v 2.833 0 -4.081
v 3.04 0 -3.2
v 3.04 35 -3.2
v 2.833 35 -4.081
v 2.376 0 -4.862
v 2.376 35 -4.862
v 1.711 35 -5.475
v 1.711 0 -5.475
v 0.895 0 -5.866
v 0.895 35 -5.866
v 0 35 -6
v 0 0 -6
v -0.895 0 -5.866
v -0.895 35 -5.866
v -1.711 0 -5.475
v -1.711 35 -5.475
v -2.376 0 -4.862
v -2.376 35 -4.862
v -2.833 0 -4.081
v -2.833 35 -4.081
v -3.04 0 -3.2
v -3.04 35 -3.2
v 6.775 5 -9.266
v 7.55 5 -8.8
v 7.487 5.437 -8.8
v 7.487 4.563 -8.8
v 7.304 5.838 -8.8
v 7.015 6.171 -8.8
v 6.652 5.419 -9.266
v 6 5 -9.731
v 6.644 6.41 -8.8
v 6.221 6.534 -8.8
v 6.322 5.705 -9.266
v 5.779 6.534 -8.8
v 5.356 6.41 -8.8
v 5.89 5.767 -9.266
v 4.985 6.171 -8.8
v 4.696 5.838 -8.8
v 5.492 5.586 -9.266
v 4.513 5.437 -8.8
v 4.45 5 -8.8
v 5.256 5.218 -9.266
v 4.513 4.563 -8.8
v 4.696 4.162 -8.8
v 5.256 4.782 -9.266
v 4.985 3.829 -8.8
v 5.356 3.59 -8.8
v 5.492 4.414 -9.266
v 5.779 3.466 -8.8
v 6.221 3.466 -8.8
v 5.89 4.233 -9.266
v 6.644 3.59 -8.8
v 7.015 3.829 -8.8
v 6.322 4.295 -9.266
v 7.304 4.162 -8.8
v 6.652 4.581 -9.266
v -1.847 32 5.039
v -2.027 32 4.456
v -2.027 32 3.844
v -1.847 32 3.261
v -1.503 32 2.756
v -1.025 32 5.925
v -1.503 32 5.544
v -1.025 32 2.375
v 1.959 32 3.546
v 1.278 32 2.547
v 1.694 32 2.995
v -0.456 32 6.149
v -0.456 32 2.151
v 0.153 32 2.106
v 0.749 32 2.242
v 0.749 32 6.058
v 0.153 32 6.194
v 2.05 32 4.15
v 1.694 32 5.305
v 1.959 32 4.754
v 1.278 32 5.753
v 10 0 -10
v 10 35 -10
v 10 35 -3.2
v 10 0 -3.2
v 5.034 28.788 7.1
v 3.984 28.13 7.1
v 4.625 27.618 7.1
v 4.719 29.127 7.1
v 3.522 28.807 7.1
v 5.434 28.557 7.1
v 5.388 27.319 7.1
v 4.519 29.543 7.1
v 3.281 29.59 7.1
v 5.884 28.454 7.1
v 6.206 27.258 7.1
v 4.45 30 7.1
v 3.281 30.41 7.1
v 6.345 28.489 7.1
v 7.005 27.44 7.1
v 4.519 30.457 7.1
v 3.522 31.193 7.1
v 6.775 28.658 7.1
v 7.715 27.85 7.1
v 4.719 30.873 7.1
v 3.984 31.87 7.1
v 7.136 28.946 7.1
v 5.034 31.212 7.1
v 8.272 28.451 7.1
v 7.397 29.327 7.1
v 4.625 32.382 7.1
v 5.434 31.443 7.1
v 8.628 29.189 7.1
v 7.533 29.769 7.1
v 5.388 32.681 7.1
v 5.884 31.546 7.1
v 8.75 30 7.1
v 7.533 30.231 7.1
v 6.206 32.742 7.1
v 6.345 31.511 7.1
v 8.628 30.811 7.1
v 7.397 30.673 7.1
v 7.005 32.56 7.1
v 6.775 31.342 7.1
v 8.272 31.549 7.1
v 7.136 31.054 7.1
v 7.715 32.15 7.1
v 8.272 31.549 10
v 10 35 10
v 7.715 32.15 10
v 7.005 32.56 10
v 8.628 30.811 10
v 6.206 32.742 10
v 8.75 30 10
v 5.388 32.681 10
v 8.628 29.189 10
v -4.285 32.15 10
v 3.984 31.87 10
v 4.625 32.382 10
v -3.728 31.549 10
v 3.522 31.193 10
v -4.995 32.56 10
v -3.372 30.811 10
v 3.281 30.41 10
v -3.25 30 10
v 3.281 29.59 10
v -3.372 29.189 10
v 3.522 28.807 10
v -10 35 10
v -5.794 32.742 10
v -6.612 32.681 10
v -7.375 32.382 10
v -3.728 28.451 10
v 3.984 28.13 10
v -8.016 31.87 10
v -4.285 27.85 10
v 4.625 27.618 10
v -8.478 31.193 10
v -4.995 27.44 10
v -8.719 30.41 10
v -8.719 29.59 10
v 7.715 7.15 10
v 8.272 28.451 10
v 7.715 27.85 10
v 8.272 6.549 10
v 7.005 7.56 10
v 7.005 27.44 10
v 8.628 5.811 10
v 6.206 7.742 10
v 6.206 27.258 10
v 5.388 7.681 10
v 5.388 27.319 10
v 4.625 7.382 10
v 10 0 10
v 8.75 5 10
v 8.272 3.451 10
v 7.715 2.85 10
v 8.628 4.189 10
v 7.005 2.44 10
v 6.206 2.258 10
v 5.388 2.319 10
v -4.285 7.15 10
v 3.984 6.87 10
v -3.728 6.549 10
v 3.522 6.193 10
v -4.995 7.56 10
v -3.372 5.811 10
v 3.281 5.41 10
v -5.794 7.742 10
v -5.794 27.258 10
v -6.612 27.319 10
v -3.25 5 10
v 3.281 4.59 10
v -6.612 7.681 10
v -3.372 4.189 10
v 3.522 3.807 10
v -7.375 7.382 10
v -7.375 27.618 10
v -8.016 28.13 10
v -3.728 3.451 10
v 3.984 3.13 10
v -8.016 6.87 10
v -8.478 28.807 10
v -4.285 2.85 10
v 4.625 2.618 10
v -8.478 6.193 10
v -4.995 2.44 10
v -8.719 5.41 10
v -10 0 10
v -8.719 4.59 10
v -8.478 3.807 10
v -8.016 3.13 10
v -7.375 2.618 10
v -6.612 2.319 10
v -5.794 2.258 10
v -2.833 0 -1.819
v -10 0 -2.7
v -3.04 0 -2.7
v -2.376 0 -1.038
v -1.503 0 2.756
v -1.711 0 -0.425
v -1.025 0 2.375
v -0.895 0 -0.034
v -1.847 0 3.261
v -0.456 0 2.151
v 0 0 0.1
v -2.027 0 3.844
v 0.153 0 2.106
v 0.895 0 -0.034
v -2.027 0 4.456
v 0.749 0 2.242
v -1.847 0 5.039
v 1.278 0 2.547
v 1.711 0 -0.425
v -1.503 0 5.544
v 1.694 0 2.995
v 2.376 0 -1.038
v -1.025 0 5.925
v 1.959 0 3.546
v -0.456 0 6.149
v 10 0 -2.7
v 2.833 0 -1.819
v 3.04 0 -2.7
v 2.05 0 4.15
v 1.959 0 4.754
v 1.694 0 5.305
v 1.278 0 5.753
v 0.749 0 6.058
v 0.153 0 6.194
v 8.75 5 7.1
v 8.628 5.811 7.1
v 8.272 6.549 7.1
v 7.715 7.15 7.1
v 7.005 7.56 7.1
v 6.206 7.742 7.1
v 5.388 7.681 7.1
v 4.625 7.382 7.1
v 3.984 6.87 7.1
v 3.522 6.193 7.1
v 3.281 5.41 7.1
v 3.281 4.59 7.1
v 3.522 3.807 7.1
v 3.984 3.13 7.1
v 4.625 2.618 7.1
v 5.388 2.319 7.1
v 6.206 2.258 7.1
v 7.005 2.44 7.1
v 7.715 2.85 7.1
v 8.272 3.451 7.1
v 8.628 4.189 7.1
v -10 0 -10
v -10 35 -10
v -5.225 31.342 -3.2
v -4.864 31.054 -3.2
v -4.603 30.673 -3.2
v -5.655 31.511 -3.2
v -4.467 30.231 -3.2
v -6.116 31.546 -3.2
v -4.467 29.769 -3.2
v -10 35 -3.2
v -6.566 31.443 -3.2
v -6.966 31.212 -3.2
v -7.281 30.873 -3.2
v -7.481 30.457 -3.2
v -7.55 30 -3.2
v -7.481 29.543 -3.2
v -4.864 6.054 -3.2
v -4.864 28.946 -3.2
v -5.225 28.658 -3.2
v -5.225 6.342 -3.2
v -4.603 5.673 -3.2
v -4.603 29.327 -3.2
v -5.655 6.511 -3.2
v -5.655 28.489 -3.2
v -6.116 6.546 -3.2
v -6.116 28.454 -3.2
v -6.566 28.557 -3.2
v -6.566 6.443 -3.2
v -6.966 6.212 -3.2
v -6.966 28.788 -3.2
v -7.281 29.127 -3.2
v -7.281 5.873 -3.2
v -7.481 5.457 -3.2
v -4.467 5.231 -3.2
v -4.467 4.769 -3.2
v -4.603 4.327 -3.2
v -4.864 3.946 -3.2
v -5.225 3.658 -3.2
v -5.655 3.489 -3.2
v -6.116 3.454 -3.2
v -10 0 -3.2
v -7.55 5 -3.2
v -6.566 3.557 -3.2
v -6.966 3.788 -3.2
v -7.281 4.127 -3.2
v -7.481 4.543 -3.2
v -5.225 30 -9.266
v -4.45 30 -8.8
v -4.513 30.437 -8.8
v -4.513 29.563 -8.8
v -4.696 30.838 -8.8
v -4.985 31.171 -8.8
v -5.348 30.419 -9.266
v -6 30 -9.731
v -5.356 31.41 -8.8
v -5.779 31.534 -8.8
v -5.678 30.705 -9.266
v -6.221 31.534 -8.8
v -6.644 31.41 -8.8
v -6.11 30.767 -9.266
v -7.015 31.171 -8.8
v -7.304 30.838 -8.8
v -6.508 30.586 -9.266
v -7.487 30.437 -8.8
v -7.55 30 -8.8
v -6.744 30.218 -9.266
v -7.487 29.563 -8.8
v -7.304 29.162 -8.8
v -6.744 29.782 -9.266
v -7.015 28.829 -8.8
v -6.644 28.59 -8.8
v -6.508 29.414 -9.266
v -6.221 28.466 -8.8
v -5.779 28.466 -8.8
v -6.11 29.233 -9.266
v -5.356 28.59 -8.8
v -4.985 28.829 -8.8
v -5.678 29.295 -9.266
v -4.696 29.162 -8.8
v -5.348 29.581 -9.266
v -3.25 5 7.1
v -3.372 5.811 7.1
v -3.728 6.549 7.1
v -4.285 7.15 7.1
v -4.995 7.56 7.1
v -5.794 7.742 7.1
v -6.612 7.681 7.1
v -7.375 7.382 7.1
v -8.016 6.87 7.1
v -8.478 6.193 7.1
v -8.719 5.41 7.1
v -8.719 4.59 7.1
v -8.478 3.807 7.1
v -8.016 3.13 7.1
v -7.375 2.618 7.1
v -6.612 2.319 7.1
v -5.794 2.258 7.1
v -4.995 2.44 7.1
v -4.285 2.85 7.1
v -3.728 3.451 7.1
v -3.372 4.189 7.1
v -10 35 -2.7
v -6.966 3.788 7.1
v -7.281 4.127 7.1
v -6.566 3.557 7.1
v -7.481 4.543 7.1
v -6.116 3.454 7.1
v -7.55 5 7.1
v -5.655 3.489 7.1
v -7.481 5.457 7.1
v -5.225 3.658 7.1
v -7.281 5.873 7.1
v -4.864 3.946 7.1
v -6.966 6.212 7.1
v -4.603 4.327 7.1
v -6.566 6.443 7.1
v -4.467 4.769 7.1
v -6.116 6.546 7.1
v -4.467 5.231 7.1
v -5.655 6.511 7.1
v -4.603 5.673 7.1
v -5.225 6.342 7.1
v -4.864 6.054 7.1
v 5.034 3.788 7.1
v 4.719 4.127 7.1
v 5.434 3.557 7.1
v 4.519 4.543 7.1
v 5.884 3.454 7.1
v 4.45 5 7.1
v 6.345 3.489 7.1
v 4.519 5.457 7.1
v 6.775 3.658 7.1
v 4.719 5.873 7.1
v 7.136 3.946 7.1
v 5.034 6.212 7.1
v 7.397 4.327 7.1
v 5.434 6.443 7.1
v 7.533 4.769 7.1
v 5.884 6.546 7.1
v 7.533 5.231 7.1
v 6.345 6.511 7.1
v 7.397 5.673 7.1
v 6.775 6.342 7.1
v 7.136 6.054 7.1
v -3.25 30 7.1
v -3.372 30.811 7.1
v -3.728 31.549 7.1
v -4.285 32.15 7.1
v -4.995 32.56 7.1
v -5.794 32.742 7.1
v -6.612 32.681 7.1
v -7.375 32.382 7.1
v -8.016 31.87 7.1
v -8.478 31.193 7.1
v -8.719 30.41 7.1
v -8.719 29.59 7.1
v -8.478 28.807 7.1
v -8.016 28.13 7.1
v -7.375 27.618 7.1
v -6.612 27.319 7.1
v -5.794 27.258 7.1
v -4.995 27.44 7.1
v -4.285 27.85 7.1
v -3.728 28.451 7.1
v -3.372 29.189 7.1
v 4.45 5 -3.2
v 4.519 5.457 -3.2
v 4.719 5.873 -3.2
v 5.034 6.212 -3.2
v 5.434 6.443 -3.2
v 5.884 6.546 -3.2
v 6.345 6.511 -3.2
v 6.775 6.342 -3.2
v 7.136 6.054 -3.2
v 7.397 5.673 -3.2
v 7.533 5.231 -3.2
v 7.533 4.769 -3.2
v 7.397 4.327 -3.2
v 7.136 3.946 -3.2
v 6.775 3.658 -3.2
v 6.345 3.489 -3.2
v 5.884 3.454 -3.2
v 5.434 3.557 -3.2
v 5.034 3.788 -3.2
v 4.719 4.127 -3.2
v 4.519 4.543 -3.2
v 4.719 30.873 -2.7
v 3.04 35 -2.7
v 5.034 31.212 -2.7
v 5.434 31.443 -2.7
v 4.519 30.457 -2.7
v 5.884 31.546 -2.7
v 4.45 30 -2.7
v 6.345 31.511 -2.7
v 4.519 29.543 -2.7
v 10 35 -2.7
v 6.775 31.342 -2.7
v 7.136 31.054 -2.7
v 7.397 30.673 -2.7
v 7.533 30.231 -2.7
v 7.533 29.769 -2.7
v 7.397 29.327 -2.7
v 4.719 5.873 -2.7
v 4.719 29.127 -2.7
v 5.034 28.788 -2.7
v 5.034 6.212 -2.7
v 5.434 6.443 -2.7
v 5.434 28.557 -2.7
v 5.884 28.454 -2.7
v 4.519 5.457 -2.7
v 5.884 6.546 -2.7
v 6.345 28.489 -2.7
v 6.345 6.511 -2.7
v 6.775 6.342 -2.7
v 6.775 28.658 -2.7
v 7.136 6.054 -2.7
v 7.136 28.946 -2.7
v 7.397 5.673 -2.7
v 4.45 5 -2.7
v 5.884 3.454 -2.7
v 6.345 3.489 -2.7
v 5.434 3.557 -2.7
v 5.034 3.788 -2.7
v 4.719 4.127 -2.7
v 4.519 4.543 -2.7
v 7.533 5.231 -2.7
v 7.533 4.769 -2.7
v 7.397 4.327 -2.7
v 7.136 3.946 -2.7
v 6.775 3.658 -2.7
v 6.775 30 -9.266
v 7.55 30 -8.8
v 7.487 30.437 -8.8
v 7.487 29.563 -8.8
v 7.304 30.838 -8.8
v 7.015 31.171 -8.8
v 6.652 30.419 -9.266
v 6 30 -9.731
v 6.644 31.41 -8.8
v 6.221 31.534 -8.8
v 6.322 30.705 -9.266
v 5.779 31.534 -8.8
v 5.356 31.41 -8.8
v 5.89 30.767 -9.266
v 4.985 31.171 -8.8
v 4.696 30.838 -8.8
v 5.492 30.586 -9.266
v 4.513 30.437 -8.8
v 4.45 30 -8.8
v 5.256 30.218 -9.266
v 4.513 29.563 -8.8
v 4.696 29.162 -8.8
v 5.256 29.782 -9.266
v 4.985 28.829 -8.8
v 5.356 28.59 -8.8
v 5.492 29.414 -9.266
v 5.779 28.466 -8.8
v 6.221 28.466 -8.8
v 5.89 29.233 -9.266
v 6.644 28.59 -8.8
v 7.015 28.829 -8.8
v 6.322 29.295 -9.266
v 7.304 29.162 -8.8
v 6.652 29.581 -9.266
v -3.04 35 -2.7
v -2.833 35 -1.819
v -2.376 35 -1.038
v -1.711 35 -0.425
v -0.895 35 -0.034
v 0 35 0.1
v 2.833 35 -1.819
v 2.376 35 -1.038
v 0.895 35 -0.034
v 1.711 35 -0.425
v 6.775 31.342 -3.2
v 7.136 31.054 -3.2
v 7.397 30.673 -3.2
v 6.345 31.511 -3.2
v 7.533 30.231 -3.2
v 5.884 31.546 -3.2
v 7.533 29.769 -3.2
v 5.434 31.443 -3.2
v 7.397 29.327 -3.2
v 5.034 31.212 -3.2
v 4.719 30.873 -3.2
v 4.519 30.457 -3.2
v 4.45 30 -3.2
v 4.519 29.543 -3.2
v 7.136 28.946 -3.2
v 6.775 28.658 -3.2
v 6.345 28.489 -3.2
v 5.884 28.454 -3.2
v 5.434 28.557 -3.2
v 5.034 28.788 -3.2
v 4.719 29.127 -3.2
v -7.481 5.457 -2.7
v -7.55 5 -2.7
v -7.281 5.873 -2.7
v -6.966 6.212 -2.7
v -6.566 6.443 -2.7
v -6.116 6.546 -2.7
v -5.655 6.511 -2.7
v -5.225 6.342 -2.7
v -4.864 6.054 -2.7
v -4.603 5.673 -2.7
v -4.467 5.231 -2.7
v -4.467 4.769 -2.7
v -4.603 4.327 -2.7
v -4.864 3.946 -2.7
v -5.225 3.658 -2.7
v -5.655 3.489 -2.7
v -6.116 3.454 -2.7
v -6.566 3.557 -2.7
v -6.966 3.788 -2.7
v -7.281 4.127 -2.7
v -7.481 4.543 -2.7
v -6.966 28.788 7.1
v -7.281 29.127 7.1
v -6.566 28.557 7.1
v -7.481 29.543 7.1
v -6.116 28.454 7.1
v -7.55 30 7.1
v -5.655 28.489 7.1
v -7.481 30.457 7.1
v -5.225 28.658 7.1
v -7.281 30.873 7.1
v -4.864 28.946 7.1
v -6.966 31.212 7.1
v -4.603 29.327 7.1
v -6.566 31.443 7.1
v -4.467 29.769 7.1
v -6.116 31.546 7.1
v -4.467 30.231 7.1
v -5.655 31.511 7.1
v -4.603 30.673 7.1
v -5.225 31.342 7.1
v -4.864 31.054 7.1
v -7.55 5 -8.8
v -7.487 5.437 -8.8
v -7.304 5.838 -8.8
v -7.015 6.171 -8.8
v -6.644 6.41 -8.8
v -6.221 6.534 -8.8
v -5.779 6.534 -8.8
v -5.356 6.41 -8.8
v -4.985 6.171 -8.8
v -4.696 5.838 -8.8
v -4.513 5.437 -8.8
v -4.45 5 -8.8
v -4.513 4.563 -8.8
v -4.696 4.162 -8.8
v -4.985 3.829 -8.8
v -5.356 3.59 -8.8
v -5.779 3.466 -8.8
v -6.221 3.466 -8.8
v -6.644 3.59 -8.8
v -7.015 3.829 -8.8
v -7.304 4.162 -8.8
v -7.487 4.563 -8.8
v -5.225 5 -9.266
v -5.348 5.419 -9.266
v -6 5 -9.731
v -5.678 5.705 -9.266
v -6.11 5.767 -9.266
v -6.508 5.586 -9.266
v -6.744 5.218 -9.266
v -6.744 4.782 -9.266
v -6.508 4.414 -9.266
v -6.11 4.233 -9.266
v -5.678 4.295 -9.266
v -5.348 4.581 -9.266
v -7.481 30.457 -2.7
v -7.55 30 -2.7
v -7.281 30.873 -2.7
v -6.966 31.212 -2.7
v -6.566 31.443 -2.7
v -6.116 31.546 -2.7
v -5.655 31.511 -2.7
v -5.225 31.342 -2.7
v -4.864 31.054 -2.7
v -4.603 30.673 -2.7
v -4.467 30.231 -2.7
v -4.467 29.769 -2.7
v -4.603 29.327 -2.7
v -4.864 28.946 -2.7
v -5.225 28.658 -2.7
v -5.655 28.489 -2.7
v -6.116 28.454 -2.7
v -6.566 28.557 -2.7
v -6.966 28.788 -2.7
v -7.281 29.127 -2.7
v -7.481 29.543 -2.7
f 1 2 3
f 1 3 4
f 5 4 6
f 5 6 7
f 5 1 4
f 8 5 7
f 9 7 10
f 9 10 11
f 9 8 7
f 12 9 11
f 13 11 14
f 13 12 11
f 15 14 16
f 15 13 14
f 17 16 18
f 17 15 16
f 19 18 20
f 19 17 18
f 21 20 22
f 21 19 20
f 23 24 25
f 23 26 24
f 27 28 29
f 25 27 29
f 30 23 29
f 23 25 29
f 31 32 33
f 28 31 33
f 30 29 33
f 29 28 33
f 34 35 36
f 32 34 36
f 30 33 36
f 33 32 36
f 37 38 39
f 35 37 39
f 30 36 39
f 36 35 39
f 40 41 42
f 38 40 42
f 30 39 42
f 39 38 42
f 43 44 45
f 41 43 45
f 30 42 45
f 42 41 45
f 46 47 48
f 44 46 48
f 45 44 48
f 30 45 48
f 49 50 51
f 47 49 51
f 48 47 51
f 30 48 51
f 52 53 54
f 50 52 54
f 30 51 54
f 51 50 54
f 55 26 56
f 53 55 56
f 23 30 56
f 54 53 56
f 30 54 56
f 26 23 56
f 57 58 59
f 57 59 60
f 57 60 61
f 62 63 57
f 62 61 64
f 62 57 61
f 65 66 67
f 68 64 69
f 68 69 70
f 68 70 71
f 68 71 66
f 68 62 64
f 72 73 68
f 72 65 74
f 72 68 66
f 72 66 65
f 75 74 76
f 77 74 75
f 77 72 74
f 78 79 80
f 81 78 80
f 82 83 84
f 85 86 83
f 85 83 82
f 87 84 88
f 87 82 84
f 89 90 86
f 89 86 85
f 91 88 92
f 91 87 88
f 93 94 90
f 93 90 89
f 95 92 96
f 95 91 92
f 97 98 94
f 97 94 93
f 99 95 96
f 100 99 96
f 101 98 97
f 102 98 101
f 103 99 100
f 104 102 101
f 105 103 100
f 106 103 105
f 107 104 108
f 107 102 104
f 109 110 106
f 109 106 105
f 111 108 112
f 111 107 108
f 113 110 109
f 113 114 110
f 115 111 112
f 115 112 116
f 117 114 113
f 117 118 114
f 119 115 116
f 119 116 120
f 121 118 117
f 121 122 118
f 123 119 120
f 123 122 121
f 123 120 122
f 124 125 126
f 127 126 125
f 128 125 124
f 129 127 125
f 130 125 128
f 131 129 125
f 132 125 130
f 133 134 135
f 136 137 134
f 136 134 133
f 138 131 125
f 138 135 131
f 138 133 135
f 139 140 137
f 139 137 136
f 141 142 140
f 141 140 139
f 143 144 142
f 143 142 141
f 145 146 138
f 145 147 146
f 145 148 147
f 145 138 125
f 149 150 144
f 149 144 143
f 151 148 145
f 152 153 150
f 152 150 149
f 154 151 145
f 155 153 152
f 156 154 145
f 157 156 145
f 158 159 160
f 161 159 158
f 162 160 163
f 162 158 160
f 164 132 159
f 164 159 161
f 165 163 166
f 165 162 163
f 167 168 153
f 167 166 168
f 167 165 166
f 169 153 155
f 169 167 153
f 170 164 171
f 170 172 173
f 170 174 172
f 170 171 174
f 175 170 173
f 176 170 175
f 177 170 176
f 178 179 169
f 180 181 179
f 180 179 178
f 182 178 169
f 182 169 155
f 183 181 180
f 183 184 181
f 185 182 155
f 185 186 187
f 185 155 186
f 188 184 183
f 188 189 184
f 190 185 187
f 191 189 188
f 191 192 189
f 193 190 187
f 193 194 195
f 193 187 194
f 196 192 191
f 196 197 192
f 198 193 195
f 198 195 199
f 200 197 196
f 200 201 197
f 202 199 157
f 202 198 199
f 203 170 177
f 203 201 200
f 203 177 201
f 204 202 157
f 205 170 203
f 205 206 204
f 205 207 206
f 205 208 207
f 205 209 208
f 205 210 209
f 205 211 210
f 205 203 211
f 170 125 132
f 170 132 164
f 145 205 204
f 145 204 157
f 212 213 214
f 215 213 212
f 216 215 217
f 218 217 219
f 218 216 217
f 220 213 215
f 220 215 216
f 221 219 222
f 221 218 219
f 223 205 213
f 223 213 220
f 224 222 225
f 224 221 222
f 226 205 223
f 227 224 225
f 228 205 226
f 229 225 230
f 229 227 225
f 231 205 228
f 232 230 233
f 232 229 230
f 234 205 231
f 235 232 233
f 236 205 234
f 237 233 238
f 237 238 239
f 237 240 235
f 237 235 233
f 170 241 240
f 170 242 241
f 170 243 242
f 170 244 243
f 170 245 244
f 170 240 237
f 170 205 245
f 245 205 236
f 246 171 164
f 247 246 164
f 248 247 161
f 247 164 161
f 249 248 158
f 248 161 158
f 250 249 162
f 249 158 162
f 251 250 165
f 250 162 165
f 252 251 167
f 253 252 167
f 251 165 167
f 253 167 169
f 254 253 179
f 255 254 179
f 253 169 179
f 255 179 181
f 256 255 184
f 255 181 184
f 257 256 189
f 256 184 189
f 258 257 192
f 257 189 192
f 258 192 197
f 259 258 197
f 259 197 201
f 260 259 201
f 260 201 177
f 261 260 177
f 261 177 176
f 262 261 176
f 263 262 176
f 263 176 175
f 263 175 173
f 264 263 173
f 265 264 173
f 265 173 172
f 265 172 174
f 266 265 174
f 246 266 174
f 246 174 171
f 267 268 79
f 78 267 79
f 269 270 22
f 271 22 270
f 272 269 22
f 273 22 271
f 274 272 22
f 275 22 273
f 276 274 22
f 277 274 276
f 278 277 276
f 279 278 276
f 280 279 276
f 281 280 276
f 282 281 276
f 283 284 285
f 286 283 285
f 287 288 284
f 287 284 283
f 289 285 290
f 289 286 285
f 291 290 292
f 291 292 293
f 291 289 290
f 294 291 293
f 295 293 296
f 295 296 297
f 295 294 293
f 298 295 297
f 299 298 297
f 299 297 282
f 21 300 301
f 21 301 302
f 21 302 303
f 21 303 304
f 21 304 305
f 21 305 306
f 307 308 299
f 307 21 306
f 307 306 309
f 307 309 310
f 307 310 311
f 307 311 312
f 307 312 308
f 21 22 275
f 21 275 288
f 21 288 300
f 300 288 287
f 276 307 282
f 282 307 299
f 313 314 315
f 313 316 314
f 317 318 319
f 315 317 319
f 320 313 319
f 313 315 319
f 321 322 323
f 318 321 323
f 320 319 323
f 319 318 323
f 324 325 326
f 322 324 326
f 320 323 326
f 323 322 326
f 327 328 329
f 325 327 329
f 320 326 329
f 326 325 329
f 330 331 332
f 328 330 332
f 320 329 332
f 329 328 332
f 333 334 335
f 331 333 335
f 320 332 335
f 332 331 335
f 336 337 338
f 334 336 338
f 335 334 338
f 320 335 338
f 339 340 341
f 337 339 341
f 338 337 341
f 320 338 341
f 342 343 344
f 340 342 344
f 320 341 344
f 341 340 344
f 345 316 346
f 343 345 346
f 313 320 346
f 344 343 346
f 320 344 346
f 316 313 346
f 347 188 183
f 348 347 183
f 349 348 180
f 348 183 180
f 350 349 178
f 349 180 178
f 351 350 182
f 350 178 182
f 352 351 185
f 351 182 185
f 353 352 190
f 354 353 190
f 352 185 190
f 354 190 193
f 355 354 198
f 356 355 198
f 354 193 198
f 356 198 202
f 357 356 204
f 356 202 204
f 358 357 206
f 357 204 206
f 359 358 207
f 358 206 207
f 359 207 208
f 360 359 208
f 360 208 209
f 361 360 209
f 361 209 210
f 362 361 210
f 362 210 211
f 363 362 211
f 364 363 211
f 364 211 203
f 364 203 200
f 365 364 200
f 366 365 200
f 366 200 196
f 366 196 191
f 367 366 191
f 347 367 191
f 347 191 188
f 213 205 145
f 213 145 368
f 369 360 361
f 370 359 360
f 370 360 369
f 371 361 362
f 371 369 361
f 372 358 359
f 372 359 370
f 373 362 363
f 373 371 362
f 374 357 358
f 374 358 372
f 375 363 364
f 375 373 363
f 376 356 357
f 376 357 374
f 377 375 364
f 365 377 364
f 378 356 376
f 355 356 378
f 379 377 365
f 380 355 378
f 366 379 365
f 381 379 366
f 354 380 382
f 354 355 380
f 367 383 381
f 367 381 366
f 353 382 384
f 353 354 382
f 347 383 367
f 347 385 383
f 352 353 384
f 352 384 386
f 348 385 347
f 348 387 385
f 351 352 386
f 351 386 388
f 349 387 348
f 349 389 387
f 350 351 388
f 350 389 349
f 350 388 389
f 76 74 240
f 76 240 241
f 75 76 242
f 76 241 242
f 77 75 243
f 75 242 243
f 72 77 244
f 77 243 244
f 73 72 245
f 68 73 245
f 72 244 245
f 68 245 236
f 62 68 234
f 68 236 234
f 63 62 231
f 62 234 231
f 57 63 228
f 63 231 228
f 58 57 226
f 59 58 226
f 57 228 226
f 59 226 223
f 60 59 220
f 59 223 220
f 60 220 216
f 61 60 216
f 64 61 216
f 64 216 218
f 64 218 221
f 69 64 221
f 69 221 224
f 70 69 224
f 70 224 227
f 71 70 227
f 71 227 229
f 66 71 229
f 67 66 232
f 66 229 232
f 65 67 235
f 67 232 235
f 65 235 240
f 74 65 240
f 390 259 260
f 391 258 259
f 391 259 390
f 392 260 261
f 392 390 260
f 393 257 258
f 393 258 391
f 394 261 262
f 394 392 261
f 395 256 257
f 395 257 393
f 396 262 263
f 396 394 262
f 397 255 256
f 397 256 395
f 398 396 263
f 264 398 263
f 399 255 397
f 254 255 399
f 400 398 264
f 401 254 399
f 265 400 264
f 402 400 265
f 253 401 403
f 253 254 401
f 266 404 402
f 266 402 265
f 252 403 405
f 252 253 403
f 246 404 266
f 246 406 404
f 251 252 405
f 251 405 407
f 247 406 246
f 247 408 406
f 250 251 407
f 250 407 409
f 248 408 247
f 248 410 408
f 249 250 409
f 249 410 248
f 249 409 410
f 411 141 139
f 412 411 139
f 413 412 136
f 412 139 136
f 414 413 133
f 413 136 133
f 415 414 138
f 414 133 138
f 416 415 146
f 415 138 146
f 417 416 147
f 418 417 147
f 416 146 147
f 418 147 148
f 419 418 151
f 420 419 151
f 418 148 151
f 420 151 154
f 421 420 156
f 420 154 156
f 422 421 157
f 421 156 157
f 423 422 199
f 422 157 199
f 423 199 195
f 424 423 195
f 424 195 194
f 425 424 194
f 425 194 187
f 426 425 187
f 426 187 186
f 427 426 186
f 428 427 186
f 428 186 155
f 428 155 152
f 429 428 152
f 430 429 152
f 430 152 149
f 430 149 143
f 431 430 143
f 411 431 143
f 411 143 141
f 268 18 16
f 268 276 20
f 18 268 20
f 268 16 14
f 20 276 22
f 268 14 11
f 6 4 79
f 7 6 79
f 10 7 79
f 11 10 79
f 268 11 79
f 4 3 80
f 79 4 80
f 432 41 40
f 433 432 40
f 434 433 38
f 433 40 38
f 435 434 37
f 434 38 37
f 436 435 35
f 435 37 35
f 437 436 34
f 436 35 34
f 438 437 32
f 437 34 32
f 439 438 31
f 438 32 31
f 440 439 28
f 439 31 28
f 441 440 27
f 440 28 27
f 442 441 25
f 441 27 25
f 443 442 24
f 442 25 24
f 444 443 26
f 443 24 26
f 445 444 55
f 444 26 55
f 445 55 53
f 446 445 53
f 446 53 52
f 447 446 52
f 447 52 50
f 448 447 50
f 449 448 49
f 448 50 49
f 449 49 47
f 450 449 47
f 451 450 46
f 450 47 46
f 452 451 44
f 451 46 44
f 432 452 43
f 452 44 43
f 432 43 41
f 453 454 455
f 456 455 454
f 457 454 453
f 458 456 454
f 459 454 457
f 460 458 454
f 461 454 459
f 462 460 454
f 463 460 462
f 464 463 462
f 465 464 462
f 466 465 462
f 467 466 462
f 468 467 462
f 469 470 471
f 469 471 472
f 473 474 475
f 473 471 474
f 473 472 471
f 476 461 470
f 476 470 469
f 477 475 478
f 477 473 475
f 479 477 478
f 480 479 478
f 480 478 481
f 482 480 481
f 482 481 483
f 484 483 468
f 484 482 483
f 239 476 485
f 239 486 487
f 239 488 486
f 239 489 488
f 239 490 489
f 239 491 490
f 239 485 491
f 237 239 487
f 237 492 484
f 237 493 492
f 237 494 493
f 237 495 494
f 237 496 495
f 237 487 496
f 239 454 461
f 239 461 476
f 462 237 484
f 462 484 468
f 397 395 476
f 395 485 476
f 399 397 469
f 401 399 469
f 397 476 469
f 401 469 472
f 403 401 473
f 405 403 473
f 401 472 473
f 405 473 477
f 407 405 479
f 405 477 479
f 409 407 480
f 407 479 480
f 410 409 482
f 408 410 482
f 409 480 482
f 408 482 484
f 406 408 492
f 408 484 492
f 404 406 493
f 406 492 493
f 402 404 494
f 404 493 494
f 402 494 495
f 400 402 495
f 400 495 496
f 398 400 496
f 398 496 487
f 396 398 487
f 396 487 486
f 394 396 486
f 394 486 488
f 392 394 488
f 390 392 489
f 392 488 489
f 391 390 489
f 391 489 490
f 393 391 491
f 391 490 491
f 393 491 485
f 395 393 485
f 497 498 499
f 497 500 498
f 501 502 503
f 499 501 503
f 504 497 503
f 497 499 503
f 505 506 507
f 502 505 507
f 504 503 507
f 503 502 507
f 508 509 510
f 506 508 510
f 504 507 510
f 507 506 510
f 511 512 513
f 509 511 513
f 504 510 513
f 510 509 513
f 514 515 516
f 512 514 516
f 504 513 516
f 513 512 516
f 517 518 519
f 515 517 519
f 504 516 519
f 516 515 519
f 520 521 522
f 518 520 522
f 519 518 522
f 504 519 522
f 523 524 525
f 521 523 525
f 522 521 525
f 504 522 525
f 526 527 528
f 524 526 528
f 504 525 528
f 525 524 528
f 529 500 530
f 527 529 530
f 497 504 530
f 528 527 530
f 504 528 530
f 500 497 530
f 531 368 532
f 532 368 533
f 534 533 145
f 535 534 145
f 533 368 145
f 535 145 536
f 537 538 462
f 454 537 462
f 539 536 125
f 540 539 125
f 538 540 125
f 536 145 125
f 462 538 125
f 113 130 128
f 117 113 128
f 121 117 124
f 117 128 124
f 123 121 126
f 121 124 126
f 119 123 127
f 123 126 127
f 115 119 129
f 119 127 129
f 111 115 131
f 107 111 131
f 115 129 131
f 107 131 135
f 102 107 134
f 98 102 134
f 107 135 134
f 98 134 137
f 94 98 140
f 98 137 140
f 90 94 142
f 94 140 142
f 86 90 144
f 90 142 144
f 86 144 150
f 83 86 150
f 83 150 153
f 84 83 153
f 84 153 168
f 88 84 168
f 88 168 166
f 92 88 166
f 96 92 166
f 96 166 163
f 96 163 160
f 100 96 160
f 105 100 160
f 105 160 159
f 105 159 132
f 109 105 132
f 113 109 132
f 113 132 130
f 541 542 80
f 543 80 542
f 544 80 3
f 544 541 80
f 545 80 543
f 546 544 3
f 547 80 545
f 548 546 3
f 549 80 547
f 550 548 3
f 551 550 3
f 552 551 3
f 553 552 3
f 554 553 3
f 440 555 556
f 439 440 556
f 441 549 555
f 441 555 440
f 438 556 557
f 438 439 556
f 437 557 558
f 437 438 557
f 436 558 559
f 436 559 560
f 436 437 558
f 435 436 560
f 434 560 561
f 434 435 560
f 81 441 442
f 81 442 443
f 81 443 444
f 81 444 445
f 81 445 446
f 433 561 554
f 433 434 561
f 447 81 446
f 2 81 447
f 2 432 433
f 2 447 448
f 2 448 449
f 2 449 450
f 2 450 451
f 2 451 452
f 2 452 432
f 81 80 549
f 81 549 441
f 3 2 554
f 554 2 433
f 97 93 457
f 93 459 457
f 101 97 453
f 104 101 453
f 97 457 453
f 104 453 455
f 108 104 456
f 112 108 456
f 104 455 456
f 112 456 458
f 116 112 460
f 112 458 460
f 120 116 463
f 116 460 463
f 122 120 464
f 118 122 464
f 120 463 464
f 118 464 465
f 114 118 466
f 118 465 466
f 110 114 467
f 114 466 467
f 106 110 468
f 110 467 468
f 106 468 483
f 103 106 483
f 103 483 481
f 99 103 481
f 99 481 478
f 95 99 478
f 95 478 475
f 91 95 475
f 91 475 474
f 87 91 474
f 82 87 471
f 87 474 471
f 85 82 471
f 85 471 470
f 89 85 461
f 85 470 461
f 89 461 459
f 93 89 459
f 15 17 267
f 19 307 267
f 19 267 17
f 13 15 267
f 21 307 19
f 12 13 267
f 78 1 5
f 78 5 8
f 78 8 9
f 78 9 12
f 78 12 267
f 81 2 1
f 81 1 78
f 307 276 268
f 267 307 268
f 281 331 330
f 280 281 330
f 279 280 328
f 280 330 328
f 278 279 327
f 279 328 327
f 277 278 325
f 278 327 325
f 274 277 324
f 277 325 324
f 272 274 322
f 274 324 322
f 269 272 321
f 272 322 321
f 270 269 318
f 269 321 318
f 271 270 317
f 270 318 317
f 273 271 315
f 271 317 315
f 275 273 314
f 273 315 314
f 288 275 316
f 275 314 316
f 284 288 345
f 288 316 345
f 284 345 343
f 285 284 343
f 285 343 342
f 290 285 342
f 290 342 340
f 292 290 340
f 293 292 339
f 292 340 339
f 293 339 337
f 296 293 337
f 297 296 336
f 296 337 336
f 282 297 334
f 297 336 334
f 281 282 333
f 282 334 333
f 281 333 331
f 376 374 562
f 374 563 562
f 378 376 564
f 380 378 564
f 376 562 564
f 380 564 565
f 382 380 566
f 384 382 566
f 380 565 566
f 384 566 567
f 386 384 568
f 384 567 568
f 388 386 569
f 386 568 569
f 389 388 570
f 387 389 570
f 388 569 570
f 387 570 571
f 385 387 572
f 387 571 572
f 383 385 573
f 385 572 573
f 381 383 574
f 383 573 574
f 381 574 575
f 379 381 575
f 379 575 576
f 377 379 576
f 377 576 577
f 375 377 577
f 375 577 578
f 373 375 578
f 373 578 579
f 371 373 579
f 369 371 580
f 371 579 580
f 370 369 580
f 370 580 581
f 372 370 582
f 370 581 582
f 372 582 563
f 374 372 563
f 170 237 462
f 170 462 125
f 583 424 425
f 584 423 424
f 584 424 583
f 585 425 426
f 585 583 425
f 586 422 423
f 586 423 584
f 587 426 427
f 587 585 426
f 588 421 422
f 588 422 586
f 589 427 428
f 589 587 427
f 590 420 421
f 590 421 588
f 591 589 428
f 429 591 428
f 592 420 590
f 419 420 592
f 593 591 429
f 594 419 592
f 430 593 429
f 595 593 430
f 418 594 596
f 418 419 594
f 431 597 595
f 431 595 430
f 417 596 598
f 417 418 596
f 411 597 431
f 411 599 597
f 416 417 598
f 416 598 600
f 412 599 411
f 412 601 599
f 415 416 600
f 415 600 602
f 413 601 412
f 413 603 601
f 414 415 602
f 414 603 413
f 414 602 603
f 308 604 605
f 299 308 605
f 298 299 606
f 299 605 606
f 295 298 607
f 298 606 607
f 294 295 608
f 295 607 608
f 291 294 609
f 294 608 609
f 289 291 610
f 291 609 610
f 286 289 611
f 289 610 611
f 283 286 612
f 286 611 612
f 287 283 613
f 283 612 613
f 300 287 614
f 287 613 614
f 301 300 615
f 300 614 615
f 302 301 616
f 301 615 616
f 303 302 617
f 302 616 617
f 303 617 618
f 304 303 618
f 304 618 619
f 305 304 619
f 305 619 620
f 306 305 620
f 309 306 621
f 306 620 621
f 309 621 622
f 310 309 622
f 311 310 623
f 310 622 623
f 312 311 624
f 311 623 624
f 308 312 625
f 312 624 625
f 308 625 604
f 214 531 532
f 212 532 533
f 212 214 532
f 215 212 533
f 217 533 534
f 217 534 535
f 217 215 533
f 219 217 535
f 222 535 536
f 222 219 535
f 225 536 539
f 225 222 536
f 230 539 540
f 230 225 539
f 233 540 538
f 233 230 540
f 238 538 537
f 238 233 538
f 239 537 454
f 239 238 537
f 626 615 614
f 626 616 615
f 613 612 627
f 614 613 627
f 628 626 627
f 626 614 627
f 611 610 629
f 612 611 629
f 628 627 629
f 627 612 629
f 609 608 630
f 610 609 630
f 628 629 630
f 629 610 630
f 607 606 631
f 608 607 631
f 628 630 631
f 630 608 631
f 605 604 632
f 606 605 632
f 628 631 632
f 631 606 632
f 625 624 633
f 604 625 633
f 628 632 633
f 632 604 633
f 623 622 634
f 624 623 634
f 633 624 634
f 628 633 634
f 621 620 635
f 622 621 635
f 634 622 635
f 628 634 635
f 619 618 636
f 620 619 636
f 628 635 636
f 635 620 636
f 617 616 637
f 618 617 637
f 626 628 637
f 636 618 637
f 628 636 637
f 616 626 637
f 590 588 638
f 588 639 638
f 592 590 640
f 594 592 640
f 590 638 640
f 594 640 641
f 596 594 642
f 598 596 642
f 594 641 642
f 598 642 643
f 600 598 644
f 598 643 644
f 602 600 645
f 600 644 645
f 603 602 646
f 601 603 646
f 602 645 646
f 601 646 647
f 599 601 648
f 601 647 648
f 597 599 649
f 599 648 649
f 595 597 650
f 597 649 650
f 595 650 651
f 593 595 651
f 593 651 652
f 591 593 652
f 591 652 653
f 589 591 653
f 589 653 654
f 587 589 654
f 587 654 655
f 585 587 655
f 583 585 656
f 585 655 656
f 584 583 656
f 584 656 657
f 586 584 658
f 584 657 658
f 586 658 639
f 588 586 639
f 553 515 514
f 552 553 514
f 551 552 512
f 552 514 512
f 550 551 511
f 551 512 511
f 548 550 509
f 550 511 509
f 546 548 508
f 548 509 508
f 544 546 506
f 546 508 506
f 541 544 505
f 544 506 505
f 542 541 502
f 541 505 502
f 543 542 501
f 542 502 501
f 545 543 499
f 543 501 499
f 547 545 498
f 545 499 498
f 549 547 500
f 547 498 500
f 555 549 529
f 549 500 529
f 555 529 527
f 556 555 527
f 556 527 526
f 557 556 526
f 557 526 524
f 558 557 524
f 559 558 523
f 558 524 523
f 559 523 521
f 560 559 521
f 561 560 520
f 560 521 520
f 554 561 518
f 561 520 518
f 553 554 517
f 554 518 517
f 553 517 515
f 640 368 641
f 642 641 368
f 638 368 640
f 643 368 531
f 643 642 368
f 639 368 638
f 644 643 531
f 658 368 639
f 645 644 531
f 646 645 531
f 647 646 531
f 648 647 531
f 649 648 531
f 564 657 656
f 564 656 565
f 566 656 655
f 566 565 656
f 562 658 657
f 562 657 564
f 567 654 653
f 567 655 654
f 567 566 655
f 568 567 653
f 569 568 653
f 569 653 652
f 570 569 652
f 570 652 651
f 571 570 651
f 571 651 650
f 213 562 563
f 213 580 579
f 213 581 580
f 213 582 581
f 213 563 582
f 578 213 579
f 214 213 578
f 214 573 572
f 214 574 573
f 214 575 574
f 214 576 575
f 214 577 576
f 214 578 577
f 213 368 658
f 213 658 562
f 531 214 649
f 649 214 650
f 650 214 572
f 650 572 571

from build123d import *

# Parameters (mm, degrees)
F0_R             = 2.05
F1_DEPTH         = 35
F2_DEPTH         = 32
F4_D             = 3.1
F4_DEPTH         = 18.8
F4_CBORE_D       = 5.5
F4_CBORE_DEPTH   = 2.9
F4_TIP           = 0.9313339595
F4_2_D           = 3.1
F4_2_DEPTH       = 18.8
F4_2_CBORE_D     = 5.5
F4_2_CBORE_DEPTH = 2.9
F4_2_TIP         = 0.9313339595


with BuildPart() as f1:
    # F0 (on Front) → F1 (new body)
    with BuildSketch(Plane.XZ):
        with BuildLine():
            Line((10, -2.7), (10, 10))
            Line((10, 10), (-10, 10))
            Line((-10, 10), (-10, -2.7))
            Line((-10, -2.7), (-3.0397368307, -2.7))
            ThreePointArc((-3.0397368307, -2.7), (0, 0.1), (3.0397368307, -2.7))
            Line((3.0397368307, -2.7), (10, -2.7))
        make_face()
        with Locations((0, 4.15)):
            Circle(F0_R, mode=Mode.SUBTRACT)
        with Locations((0, 4.15)):
            Circle(F0_R)
    extrude(amount=-F1_DEPTH)

    # F0 (on Front) → F2 (cut)
    with BuildSketch(Plane.XZ):
        with Locations((0, 4.15)):
            Circle(F0_R)
    extrude(amount=-F2_DEPTH, mode=Mode.SUBTRACT)

    # F4
    with Locations(Plane.XY.offset(10)):
        with Locations((-6, 30), (6, 30), (-6, 5), (6, 5)):
            CounterBoreHole(F4_D / 2, F4_CBORE_D / 2, F4_CBORE_DEPTH, depth=F4_DEPTH)
            with Locations((0, 0, -(F4_DEPTH + F4_TIP / 2))):  # 118° drill point
                Cone(0, F4_D / 2, F4_TIP, mode=Mode.SUBTRACT)


with BuildPart() as f1b:
    # F0 (on Front) → F1, piece 2 (new body)
    with BuildSketch(Plane.XZ):
        with BuildLine():
            Line((10, -10), (10, -3.2))
            Line((10, -3.2), (3.0397368307, -3.2))
            ThreePointArc((3.0397368307, -3.2), (0, -6), (-3.0397368307, -3.2))
            Line((-3.0397368307, -3.2), (-10, -3.2))
            Line((-10, -3.2), (-10, -10))
            Line((-10, -10), (10, -10))
        make_face()
    extrude(amount=-F1_DEPTH)

    # F4#2
    with Locations(Plane.XY.offset(10)):
        with Locations((-6, 30), (6, 30), (-6, 5), (6, 5)):
            CounterBoreHole(F4_2_D / 2, F4_2_CBORE_D / 2, F4_2_CBORE_DEPTH, depth=F4_2_DEPTH)
            with Locations((0, 0, -(F4_2_DEPTH + F4_2_TIP / 2))):  # 118° drill point
                Cone(0, F4_2_D / 2, F4_2_TIP, mode=Mode.SUBTRACT)


solid = Compound([f1.part, f1b.part])
